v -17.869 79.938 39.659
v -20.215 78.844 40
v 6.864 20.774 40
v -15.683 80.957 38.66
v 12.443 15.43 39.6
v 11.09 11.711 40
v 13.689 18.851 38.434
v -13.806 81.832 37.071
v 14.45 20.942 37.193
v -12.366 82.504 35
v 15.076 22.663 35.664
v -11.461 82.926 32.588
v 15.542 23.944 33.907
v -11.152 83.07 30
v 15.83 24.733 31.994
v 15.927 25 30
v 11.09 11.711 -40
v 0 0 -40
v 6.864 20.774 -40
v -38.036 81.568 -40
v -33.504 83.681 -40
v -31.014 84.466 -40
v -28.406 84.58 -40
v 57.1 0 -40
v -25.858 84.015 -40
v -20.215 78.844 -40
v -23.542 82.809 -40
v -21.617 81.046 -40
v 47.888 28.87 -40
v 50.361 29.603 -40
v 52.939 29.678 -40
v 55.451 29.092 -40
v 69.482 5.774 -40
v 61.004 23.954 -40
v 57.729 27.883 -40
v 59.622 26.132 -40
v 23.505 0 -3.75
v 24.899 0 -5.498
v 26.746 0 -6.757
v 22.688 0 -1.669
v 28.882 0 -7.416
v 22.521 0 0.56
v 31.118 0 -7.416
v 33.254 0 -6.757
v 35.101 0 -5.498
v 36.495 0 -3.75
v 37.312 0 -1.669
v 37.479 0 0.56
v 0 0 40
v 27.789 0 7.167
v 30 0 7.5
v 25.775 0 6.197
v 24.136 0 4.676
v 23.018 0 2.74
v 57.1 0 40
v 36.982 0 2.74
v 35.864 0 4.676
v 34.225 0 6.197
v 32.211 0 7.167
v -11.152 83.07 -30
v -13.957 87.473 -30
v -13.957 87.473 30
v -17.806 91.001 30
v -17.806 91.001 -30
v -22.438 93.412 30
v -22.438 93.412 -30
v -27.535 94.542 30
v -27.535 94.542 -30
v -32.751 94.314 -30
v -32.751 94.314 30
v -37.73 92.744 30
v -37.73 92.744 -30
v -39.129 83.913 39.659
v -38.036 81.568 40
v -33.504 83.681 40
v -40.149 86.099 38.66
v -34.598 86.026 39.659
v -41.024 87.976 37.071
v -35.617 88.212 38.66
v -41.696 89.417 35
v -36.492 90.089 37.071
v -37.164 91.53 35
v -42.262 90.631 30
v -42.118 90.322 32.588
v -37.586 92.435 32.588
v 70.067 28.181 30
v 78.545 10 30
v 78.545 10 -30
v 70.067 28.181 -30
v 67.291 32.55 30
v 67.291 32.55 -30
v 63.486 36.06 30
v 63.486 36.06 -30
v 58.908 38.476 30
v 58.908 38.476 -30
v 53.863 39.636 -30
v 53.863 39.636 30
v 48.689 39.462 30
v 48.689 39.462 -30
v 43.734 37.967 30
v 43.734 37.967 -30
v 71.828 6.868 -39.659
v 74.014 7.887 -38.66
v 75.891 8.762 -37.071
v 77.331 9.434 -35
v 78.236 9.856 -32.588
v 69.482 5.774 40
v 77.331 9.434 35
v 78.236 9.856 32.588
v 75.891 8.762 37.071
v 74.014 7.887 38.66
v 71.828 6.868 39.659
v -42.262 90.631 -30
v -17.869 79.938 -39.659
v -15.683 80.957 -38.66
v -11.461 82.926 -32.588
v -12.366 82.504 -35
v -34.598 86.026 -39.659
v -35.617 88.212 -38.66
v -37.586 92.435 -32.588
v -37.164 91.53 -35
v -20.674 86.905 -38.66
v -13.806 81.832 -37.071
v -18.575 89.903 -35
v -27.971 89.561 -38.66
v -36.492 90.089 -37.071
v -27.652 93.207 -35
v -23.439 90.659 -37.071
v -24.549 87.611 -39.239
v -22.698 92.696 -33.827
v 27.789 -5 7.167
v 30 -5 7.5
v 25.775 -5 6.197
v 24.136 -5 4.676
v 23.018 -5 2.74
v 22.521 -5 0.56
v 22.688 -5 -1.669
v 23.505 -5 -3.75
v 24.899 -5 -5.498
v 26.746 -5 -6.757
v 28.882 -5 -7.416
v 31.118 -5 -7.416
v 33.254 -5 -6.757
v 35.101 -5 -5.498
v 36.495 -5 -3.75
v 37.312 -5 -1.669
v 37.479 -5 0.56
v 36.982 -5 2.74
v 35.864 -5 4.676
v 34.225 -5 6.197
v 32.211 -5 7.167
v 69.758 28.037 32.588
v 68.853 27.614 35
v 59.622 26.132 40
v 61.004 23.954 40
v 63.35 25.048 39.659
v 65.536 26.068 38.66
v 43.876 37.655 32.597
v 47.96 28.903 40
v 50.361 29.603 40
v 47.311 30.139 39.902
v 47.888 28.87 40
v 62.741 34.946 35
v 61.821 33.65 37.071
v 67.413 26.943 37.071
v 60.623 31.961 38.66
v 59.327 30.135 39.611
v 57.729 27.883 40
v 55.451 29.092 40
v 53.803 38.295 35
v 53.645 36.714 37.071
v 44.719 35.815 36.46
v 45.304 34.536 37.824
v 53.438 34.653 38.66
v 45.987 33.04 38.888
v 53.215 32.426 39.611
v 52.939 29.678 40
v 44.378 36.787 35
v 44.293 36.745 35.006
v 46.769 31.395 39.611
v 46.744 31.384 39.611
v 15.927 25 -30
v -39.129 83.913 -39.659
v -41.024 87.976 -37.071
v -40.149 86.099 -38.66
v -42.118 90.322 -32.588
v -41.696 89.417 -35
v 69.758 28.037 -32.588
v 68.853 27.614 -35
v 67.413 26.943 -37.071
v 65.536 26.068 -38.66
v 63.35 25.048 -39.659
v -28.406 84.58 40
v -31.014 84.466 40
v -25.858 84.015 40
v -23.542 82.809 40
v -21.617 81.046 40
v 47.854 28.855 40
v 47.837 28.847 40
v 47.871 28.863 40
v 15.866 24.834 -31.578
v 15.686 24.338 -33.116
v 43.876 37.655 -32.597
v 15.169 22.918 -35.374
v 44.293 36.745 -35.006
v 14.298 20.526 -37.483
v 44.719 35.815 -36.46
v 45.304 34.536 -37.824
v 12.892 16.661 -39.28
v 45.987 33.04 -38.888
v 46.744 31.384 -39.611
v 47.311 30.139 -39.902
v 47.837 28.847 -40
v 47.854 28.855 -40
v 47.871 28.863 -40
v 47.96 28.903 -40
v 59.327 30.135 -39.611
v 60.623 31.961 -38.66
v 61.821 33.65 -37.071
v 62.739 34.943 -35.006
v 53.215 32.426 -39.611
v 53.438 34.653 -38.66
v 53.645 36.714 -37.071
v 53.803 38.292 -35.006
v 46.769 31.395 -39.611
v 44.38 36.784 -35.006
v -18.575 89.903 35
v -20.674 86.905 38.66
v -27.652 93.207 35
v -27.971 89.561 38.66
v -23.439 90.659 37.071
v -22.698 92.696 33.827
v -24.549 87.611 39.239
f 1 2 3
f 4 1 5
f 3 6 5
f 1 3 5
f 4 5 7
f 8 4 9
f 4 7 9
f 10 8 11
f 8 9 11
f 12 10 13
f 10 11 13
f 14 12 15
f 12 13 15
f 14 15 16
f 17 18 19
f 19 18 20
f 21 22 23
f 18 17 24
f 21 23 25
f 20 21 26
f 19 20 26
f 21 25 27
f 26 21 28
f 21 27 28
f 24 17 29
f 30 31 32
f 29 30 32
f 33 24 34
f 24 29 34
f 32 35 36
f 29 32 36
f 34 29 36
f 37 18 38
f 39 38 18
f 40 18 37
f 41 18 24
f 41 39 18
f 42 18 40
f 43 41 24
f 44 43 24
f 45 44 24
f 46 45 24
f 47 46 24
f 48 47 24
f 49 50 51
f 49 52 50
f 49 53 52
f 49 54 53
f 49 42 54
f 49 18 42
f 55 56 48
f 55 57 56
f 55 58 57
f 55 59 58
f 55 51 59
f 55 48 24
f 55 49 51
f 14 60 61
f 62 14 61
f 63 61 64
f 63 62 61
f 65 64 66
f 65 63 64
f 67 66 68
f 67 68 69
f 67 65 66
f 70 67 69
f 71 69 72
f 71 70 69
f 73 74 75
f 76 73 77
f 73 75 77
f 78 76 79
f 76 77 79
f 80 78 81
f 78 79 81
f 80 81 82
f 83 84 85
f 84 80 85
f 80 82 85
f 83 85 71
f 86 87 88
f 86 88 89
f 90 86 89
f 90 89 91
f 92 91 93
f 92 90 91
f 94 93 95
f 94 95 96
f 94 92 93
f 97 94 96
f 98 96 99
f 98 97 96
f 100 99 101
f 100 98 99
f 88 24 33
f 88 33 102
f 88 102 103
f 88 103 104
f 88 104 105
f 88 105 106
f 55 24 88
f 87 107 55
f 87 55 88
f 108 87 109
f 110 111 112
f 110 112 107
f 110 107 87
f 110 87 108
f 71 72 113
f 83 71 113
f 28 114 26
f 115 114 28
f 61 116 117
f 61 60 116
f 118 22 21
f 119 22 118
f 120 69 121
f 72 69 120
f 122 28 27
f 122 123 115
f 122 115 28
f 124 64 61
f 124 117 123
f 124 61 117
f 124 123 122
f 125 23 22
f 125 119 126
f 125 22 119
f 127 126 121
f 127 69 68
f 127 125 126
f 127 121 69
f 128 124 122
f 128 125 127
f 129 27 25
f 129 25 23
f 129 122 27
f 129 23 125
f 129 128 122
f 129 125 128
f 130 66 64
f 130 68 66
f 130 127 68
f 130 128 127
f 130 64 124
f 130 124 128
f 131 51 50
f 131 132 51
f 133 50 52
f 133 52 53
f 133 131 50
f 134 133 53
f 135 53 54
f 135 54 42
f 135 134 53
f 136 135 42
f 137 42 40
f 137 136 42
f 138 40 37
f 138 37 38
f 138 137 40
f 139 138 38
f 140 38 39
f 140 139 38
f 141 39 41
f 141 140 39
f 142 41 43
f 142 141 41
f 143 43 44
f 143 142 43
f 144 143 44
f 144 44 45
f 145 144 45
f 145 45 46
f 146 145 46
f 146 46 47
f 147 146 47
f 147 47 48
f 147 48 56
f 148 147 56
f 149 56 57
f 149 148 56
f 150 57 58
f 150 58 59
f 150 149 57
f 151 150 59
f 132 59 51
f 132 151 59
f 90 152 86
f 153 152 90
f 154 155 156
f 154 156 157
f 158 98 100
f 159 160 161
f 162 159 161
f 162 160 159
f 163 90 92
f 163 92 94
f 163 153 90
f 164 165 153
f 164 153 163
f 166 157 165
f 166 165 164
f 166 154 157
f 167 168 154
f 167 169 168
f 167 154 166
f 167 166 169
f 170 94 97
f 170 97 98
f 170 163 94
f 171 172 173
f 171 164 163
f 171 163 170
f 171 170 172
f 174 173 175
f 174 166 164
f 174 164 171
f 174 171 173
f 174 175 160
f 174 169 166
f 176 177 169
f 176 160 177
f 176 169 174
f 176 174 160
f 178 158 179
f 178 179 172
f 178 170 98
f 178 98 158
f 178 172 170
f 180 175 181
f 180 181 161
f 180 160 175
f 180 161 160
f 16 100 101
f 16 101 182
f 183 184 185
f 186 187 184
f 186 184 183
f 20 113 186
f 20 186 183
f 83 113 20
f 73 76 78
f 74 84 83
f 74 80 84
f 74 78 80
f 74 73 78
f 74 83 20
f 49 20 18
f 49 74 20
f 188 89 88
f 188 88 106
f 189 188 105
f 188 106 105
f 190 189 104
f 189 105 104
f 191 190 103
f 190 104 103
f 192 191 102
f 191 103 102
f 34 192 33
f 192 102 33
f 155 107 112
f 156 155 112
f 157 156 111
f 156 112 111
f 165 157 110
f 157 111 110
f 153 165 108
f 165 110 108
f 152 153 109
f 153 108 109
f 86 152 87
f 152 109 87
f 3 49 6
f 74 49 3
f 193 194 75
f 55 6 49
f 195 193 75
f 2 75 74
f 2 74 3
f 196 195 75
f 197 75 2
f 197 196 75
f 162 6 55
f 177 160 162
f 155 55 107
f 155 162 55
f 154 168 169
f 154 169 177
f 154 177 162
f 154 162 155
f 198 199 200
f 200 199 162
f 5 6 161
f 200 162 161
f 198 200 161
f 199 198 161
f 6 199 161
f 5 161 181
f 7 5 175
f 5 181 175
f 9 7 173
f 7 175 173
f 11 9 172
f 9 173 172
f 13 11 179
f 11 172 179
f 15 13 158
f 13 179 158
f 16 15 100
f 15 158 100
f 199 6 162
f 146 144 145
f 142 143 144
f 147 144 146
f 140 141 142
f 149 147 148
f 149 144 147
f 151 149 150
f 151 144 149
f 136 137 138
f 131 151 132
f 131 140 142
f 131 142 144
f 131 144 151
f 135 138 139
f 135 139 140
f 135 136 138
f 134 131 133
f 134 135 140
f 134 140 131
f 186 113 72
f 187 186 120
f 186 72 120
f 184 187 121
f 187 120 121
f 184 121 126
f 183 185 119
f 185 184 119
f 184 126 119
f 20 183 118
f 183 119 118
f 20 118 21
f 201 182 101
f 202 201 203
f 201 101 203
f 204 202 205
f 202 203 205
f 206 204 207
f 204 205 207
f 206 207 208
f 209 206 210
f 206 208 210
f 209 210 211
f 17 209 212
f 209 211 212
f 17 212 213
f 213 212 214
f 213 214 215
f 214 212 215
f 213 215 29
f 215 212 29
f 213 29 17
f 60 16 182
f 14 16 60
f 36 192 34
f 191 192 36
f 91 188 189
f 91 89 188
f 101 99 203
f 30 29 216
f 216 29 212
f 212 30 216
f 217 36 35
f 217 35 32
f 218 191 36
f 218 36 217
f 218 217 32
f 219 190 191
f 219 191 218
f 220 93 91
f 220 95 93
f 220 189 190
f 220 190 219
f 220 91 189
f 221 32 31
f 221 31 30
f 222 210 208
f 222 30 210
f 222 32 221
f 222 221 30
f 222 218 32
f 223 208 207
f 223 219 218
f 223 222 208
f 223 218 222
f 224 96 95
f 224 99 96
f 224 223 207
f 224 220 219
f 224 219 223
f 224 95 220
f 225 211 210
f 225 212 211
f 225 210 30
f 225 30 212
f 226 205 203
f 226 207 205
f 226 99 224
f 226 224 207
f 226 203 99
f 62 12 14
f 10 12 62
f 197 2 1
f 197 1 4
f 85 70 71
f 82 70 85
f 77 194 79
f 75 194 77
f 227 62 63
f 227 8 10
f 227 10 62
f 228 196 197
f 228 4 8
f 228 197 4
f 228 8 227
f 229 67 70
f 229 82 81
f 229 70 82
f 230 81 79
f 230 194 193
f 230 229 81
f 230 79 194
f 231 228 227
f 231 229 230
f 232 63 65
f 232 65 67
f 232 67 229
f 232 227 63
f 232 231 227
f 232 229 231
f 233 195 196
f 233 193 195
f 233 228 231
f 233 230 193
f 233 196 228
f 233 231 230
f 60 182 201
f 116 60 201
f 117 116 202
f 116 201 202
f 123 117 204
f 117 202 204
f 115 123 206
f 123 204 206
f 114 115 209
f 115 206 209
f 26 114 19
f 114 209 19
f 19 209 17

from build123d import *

# Parameters (mm, degrees)
BOSS_EXTRUDE1_DEPTH = 40
SKETCH2_R           = 7.5
BOSS_EXTRUDE2_DEPTH = 5
FILLET1_R           = 10


with BuildPart() as part:
    # Sketch1 → Boss-Extrude1 (new, symmetric)
    with BuildSketch(Plane.XY):
        with BuildLine():
            Line((-42.261826174, 90.630778704), (0, 0))
            Line((0, 0), (57.1, 0))
            Line((57.1, 0), (78.545069205, 10))
            Line((78.545069205, 10), (70.06731645, 28.180599453))
            ThreePointArc((70.06731645, 28.180599453), (58.907926391, 38.47561206), (43.733601964, 37.96654498))
            Line((43.733601964, 37.96654498), (15.92675652, 25))
            Line((15.92675652, 25), (-11.151766263, 83.070079506))
            ThreePointArc((-11.151766263, 83.070079506), (-22.437519138, 93.411566687), (-37.730287239, 92.743870012))
            Line((-37.730287239, 92.743870012), (-42.261826174, 90.630778704))
        make_face()
    extrude(amount=BOSS_EXTRUDE1_DEPTH, both=True)

    # Sketch2 → Boss-Extrude2 (add, symmetric)
    with BuildSketch(Plane.XZ):
        with Locations(Location((30, 0, 0), (0, 0, 90))):
            Circle(SKETCH2_R)
    extrude(amount=BOSS_EXTRUDE2_DEPTH, both=True)

    # Fillet1
    # the kernel refuses this fillet: 10 mm, written as the material it takes off along each edge
    with BuildSketch(Plane(origin=(43.733601964, 37.96654498, -40), x_dir=(0.42261826174070133, -0.9063077870366492, 0), z_dir=(-0.9063077870366492, -0.4226182617407013, 0))) as fillet1_piece_1:
        with BuildLine():
            CenterArc((FILLET1_R, FILLET1_R), FILLET1_R, 180, 90)
            Line((0, FILLET1_R), (0, 0))
            Line((0, 0), (FILLET1_R, 0))
        make_face()
    extrude(amount=30.681459259, mode=Mode.SUBTRACT)
    with BuildSketch(Plane(origin=(51.94116071, 19.728234218, -40), x_dir=(0.9063077870366498, 0.42261826174069983, 0), z_dir=(0.42261826174069983, -0.9063077870366498, 0))) as fillet1_piece_2:
        with BuildLine():
            CenterArc((20 - FILLET1_R, FILLET1_R), FILLET1_R, 270, 90)
            Line((20, FILLET1_R), (20, 0))
            Line((20, 0), (20 - FILLET1_R, 0))
        make_face()
    revolve(axis=Axis((51.94116071, 19.728234218, -40), (0, 0, 1)), revolution_arc=89.228578439, mode=Mode.SUBTRACT)
    with BuildSketch(Plane(origin=(89.110525749, -12.657694676, -40), x_dir=(-0.90630778703665, -0.4226182617406995, 0), z_dir=(-0.42261826174069944, 0.9063077870366499, 0))) as fillet1_piece_3:
        with BuildLine():
            CenterArc((FILLET1_R, FILLET1_R), FILLET1_R, 180, 90)
            Line((0, FILLET1_R), (0, 0))
            Line((0, 0), (FILLET1_R, 0))
        make_face()
    extrude(amount=45.06007199, mode=Mode.SUBTRACT)
    with BuildSketch(Plane(origin=(-37.730287239, 92.743870012, -40), x_dir=(0.4226182617406985, -0.9063077870366504, 0), z_dir=(-0.9063077870366504, -0.42261826174069855, 0))) as fillet1_piece_4:
        with BuildLine():
            CenterArc((FILLET1_R, FILLET1_R), FILLET1_R, 180, 90)
            Line((0, FILLET1_R), (0, 0))
            Line((0, 0), (FILLET1_R, 0))
        make_face()
    extrude(amount=30, mode=Mode.SUBTRACT)
    with BuildSketch(Plane(origin=(89.110525749, -12.657694676, 40), x_dir=(-0.90630778703665, -0.4226182617406995, 0), z_dir=(-0.42261826174069944, 0.9063077870366499, 0))) as fillet1_piece_5:
        with BuildLine():
            CenterArc((FILLET1_R, -FILLET1_R), FILLET1_R, 90, 90)
            Line((0, -FILLET1_R), (0, 0))
            Line((0, 0), (FILLET1_R, 0))
        make_face()
    extrude(amount=45.06007199, mode=Mode.SUBTRACT)
    with BuildSketch(Plane(origin=(51.94116071, 19.728234218, 40), x_dir=(0.9063077870366498, 0.42261826174069983, 0), z_dir=(0.42261826174069983, -0.9063077870366498, 0))) as fillet1_piece_6:
        with BuildLine():
            CenterArc((20 - FILLET1_R, -FILLET1_R), FILLET1_R, 0, 90)
            Line((20, -FILLET1_R), (20, 0))
            Line((20, 0), (20 - FILLET1_R, 0))
        make_face()
    revolve(axis=Axis((51.94116071, 19.728234218, 40), (0, 0, 1)), revolution_arc=89.228578439, mode=Mode.SUBTRACT)
    with BuildSketch(Plane(origin=(43.733601964, 37.96654498, 40), x_dir=(0.42261826174070133, -0.9063077870366492, 0), z_dir=(-0.9063077870366492, -0.4226182617407013, 0))) as fillet1_piece_7:
        with BuildLine():
            CenterArc((FILLET1_R, -FILLET1_R), FILLET1_R, 90, 90)
            Line((0, -FILLET1_R), (0, 0))
            Line((0, 0), (FILLET1_R, 0))
        make_face()
    extrude(amount=30.681459259, mode=Mode.SUBTRACT)
    with BuildSketch(Plane(origin=(15.92675652, 25, 40), x_dir=(-0.9063077870366495, -0.42261826174070066, 0), z_dir=(-0.42261826174070066, 0.9063077870366494, 0))) as fillet1_piece_8:
        with BuildLine():
            CenterArc((FILLET1_R, -FILLET1_R), FILLET1_R, 90, 90)
            Line((0, -FILLET1_R), (0, 0))
            Line((0, 0), (FILLET1_R, 0))
        make_face()
    extrude(amount=64.07324348, mode=Mode.SUBTRACT)
    with BuildSketch(Plane(origin=(-29.277922004, 74.617714272, 40), x_dir=(0.9063077870366488, 0.4226182617407019, 0), z_dir=(0.4226182617407019, -0.9063077870366488, 0))) as fillet1_piece_9:
        with BuildLine():
            CenterArc((20 - FILLET1_R, -FILLET1_R), FILLET1_R, 0, 90)
            Line((20, -FILLET1_R), (20, 0))
            Line((20, 0), (20 - FILLET1_R, 0))
        make_face()
    revolve(axis=Axis((-29.277922004, 74.617714272, 40), (0, 0, 1)), revolution_arc=90, mode=Mode.SUBTRACT)
    with BuildSketch(Plane(origin=(-37.730287239, 92.743870012, 40), x_dir=(0.4226182617406985, -0.9063077870366504, 0), z_dir=(-0.9063077870366504, -0.42261826174069855, 0))) as fillet1_piece_10:
        with BuildLine():
            CenterArc((FILLET1_R, -FILLET1_R), FILLET1_R, 90, 90)
            Line((0, -FILLET1_R), (0, 0))
            Line((0, 0), (FILLET1_R, 0))
        make_face()
    extrude(amount=30, mode=Mode.SUBTRACT)
    with BuildSketch(Plane(origin=(-29.277922004, 74.617714272, -40), x_dir=(0.9063077870366488, 0.4226182617407019, 0), z_dir=(0.4226182617407019, -0.9063077870366488, 0))) as fillet1_piece_11:
        with BuildLine():
            CenterArc((20 - FILLET1_R, FILLET1_R), FILLET1_R, 270, 90)
            Line((20, FILLET1_R), (20, 0))
            Line((20, 0), (20 - FILLET1_R, 0))
        make_face()
    revolve(axis=Axis((-29.277922004, 74.617714272, -40), (0, 0, 1)), revolution_arc=90, mode=Mode.SUBTRACT)
    with BuildSketch(Plane(origin=(15.92675652, 25, -40), x_dir=(-0.9063077870366495, -0.42261826174070066, 0), z_dir=(-0.42261826174070066, 0.9063077870366494, 0))) as fillet1_piece_12:
        with BuildLine():
            CenterArc((FILLET1_R, FILLET1_R), FILLET1_R, 180, 90)
            Line((0, FILLET1_R), (0, 0))
            Line((0, 0), (FILLET1_R, 0))
        make_face()
    extrude(amount=64.07324348, mode=Mode.SUBTRACT)
    with BuildSketch(Plane(origin=(43.733601964, 37.96654498, -40), x_dir=(0.42261826174070133, -0.9063077870366492, 0), z_dir=(-0.9063077870366492, -0.4226182617407013, 0))) as fillet1_piece_13a_section:
        with BuildLine():
            CenterArc((FILLET1_R, FILLET1_R), FILLET1_R, 180, 90)
            Line((0, FILLET1_R), (0, 0))
            Line((0, 0), (FILLET1_R, 0))
        make_face()
    fillet1_piece_13a = extrude(amount=55.681459259, mode=Mode.PRIVATE)
    fillet1_piece_13a = split(fillet1_piece_13a, bisect_by=Plane(origin=(16.883543617, 22.94816345, -37.736048857), z_dir=(-0.9063077870366494, -0.42261826174070066, 0)), keep=Keep.TOP, mode=Mode.PRIVATE)
    with BuildSketch(Plane(origin=(26.492213064, 2.342305324, -40), x_dir=(-0.9063077870366495, -0.42261826174070066, 0), z_dir=(-0.42261826174070066, 0.9063077870366494, 0))) as fillet1_piece_13b_section:
        with BuildLine():
            CenterArc((FILLET1_R, FILLET1_R), FILLET1_R, 180, 90)
            Line((0, FILLET1_R), (0, 0))
            Line((0, 0), (FILLET1_R, 0))
        make_face()
    fillet1_piece_13b = extrude(amount=89.07324348, mode=Mode.PRIVATE)
    fillet1_piece_13b = split(fillet1_piece_13b, bisect_by=Plane(origin=(13.87491997, 24.043212903, -37.736048857), z_dir=(0.4226182617407013, -0.9063077870366492, 0)), keep=Keep.TOP, mode=Mode.PRIVATE)
    fillet1_piece_13 = fillet1_piece_13a & fillet1_piece_13b
    add(fillet1_piece_13, mode=Mode.SUBTRACT)
    with BuildSketch(Plane(origin=(43.733601964, 37.96654498, 40), x_dir=(0.42261826174070133, -0.9063077870366492, 0), z_dir=(-0.9063077870366492, -0.4226182617407013, 0))) as fillet1_piece_14a_section:
        with BuildLine():
            CenterArc((FILLET1_R, -FILLET1_R), FILLET1_R, 90, 90)
            Line((0, -FILLET1_R), (0, 0))
            Line((0, 0), (FILLET1_R, 0))
        make_face()
    fillet1_piece_14a = extrude(amount=55.681459259, mode=Mode.PRIVATE)
    fillet1_piece_14a = split(fillet1_piece_14a, bisect_by=Plane(origin=(16.883543617, 22.94816345, 37.736048857), z_dir=(-0.9063077870366494, -0.42261826174070066, 0)), keep=Keep.TOP, mode=Mode.PRIVATE)
    with BuildSketch(Plane(origin=(26.492213064, 2.342305324, 40), x_dir=(-0.9063077870366495, -0.42261826174070066, 0), z_dir=(-0.42261826174070066, 0.9063077870366494, 0))) as fillet1_piece_14b_section:
        with BuildLine():
            CenterArc((FILLET1_R, -FILLET1_R), FILLET1_R, 90, 90)
            Line((0, -FILLET1_R), (0, 0))
            Line((0, 0), (FILLET1_R, 0))
        make_face()
    fillet1_piece_14b = extrude(amount=89.07324348, mode=Mode.PRIVATE)
    fillet1_piece_14b = split(fillet1_piece_14b, bisect_by=Plane(origin=(13.87491997, 24.043212903, 37.736048857), z_dir=(0.4226182617407013, -0.9063077870366492, 0)), keep=Keep.TOP, mode=Mode.PRIVATE)
    fillet1_piece_14 = fillet1_piece_14a & fillet1_piece_14b
    add(fillet1_piece_14, mode=Mode.SUBTRACT)


solid = part.part
